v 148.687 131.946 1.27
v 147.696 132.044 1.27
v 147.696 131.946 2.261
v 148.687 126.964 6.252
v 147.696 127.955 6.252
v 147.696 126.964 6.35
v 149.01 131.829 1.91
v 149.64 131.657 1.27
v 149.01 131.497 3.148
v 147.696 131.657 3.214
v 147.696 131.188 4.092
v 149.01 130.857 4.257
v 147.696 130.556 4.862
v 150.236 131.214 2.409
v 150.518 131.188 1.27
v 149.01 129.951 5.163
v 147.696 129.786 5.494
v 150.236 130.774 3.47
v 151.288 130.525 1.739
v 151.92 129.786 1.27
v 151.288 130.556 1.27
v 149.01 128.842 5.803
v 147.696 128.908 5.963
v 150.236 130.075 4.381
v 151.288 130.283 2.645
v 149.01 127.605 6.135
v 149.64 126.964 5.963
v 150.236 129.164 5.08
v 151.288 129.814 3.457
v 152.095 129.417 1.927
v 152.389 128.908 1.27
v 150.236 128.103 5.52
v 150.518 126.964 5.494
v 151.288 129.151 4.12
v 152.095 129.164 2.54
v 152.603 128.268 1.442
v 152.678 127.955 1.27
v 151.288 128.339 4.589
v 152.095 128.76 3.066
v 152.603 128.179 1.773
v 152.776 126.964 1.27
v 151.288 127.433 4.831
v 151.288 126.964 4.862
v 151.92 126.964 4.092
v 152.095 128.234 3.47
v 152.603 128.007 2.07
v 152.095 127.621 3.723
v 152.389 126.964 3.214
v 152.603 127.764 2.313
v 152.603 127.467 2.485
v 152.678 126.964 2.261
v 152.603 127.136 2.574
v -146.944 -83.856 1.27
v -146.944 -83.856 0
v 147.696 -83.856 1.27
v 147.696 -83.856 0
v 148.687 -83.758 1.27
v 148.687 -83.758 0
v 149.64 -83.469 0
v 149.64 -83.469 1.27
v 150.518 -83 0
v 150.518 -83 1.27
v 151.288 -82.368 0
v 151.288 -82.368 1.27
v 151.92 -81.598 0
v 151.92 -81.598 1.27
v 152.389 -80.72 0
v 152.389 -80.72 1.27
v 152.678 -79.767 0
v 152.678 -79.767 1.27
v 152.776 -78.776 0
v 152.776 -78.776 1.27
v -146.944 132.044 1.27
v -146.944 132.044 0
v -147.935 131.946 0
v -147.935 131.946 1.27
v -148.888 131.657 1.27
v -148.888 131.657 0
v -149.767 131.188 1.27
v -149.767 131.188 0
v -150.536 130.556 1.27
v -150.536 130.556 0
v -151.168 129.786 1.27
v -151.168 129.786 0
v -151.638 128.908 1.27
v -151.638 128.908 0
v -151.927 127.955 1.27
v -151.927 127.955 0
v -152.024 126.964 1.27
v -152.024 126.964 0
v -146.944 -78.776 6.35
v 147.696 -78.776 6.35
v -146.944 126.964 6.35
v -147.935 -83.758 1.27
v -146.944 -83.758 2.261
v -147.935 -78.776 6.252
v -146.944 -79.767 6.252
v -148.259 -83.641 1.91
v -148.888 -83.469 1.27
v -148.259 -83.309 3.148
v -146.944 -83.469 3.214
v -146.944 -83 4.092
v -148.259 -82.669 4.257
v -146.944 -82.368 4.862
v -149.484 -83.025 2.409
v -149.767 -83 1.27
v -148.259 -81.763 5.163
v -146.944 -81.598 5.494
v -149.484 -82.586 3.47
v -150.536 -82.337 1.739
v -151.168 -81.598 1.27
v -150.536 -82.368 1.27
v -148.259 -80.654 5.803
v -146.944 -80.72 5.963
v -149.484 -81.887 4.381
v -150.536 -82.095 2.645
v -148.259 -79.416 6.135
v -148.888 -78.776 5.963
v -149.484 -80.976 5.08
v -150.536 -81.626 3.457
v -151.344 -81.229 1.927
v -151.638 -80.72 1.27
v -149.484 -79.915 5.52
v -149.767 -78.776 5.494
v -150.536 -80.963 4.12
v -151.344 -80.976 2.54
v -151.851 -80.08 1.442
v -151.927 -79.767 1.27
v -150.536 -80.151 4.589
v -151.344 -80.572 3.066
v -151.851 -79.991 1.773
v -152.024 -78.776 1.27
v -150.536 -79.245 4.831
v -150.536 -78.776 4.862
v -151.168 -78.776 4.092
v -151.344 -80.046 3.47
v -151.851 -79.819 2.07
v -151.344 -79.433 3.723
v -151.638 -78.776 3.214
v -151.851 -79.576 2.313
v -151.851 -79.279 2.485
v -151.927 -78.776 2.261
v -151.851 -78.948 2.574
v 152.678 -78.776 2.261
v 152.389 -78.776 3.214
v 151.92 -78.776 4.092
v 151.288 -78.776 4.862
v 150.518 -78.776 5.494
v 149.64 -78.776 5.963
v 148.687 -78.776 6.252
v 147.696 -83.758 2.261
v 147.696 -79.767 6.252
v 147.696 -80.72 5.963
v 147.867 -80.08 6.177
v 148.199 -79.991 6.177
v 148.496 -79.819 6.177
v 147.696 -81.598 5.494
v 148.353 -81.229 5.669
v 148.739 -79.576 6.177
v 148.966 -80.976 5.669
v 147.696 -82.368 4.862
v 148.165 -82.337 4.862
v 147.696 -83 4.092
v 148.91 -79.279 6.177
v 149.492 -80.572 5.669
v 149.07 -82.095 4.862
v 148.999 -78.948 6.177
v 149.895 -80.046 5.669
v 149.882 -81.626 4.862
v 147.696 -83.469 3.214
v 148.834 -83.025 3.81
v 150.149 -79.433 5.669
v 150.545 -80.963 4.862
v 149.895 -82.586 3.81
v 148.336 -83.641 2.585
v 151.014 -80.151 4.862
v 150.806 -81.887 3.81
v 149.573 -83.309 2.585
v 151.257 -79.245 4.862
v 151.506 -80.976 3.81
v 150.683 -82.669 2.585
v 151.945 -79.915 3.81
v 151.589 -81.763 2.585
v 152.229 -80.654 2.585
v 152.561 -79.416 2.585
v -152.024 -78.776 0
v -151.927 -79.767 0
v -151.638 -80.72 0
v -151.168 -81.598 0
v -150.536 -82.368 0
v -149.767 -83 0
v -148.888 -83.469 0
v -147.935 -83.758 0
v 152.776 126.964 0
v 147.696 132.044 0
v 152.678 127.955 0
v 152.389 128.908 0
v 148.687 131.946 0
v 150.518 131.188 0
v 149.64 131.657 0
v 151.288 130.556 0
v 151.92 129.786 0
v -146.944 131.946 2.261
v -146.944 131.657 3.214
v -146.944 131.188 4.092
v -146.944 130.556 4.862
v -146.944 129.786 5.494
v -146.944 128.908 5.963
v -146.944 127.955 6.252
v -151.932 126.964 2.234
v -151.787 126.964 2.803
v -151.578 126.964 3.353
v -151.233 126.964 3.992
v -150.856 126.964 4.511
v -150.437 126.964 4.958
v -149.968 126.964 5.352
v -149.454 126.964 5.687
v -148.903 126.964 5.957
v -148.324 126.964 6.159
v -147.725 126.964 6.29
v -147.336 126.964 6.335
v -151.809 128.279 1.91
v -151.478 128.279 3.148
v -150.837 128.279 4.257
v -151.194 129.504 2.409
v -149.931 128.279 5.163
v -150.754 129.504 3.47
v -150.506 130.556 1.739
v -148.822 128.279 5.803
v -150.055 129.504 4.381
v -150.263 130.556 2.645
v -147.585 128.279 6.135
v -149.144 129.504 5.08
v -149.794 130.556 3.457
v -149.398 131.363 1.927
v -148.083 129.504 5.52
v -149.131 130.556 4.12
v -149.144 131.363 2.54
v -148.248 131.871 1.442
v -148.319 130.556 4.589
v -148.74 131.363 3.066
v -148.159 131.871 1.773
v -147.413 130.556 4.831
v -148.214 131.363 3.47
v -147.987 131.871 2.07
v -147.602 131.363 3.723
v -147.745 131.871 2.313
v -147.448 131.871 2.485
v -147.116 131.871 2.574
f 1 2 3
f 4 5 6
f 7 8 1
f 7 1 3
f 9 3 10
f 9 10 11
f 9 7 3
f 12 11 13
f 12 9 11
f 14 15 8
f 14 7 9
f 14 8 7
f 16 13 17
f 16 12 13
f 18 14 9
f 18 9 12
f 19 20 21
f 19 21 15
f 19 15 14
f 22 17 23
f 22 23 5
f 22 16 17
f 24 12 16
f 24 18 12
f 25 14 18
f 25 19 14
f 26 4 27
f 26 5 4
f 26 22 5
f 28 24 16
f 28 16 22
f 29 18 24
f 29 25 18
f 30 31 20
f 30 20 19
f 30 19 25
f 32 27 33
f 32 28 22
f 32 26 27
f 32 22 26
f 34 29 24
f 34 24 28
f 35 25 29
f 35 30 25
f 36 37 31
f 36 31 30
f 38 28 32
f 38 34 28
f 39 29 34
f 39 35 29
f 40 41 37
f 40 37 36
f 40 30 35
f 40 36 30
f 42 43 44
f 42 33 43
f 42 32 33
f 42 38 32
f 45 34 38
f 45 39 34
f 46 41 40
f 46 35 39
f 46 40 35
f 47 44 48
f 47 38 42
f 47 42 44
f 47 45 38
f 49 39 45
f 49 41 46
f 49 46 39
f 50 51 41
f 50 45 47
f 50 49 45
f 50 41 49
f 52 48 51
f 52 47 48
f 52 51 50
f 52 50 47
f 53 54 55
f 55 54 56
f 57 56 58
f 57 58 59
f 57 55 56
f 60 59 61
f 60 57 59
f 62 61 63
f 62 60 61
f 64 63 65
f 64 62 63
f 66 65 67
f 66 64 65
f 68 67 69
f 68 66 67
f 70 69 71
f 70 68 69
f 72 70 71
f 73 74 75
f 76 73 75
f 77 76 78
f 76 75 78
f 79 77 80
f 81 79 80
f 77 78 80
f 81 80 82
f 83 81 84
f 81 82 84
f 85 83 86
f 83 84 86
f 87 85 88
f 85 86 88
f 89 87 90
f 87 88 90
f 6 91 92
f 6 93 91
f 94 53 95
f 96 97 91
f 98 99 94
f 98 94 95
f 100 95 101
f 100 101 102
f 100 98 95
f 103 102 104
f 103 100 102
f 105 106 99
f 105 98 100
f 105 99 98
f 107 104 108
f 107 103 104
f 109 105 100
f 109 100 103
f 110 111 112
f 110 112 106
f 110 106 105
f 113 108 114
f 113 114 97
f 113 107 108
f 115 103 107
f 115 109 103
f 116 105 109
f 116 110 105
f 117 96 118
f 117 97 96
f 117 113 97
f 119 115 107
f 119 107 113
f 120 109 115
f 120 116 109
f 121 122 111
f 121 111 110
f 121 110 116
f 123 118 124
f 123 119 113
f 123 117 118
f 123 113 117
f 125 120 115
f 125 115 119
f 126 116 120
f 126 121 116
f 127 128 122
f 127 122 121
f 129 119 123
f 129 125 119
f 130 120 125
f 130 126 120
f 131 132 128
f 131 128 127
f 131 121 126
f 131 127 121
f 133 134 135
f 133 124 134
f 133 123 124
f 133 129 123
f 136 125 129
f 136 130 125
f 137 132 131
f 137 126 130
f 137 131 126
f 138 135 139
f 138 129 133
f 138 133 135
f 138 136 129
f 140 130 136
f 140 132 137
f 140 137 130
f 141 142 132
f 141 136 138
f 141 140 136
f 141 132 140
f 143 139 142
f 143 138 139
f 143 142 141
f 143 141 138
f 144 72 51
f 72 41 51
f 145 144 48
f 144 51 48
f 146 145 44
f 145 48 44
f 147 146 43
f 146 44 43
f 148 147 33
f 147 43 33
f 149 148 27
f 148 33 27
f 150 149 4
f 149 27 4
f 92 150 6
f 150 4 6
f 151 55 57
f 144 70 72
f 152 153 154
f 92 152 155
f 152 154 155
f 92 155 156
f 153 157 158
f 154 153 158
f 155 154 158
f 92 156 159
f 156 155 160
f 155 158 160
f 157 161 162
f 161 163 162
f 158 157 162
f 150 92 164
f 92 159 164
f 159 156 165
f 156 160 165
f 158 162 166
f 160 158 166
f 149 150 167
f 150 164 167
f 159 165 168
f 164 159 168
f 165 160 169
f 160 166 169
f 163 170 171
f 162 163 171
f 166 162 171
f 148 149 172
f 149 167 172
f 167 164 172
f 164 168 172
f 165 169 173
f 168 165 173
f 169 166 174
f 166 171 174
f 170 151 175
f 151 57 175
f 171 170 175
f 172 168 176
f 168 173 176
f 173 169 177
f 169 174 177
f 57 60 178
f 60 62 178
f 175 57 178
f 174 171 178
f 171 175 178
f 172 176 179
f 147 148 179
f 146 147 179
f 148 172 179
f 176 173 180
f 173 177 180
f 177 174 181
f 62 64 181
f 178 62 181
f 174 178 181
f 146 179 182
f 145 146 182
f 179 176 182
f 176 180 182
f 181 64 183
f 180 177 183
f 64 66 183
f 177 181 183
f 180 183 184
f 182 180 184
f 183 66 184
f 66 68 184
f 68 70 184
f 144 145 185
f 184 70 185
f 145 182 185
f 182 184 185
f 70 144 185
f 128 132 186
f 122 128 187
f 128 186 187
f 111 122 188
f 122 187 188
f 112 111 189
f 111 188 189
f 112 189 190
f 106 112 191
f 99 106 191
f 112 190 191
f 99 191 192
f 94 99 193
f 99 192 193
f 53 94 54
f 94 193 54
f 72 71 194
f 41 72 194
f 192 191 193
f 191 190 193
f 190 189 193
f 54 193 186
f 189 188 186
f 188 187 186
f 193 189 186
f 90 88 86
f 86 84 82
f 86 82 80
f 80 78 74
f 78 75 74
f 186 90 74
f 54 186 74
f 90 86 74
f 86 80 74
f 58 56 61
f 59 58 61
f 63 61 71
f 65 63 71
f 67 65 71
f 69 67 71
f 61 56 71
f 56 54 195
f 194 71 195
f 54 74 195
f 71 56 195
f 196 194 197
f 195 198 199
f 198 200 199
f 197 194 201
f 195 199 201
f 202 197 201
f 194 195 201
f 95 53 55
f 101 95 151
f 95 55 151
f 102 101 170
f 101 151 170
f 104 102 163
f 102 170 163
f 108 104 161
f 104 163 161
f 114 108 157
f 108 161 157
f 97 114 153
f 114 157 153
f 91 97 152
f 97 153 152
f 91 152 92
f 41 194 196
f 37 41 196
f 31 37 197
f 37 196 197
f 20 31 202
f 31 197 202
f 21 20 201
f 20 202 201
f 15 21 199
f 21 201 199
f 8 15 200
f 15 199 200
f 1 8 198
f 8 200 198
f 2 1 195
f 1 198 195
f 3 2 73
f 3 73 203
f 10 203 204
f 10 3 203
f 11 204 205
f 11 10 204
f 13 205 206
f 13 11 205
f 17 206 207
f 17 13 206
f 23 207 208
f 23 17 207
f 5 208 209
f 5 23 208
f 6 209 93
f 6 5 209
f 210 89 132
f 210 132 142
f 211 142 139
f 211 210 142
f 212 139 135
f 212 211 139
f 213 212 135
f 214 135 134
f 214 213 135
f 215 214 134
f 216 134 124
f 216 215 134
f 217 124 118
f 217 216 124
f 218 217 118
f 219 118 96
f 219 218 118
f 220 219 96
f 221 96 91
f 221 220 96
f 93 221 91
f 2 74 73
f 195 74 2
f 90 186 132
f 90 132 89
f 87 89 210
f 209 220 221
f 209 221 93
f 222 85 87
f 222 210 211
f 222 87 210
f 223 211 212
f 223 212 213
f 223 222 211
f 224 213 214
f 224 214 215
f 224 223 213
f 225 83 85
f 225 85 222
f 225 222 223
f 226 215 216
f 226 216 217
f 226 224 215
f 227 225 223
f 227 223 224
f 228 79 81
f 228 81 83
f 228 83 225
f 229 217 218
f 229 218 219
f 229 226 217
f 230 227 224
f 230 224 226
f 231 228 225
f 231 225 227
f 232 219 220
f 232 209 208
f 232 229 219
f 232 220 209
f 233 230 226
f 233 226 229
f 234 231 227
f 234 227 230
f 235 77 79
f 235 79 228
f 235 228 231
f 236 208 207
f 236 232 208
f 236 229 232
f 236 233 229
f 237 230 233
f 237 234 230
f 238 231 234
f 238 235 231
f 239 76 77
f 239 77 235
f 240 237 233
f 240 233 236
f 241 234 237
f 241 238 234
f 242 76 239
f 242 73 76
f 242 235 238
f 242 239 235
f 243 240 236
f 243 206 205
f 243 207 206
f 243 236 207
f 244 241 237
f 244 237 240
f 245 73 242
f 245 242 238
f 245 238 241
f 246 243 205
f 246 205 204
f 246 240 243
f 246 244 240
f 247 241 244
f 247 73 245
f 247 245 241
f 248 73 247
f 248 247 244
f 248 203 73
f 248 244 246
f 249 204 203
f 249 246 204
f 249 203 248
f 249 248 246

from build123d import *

# Parameters (mm, degrees)
F0_W         = 304.8
F0_H         = 215.9
F1_DEPTH     = 6.35
F2_R         = 5.08
F3_T1_DEPTH  = 13.97
F3_S5_W      = 5.08
F3_S5_H      = 5.08
F3_T6_DEPTH  = 5.08
F3_S11_W     = 5.08
F3_S11_H     = 5.08
F3_T12_DEPTH = 5.08
F3_S17_W     = 5.08
F3_S17_H     = 5.08
F3_T18_DEPTH = 5.08


# Not quite as in the source:
# - a fillet or chamfer that OpenCascade refuses, or shapes differently, is made with other operations: its cross-section is extruded or revolved along the edge and cut away or added


with BuildPart() as f1:
    # F0 (on Top) → F1 (new body)
    with BuildSketch(Plane.XY):
        with Locations((0.3756433725, 24.0940256725)):
            Rectangle(F0_W, F0_H)
    extrude(amount=F1_DEPTH)

    # F2
    f2_edges = [f1.edges().sort_by_distance(p)[0] for p in [
        (152.775643, -83.855974, 3.175),
        (0.375643, -83.855974, 6.35),
        (-152.024357, 24.094026, 6.35),
        (0.375643, 132.044026, 6.35),
        (152.775643, 24.094026, 6.35),
    ]]
    fillet(f2_edges, radius=F2_R)

    # F3: fillet of radius 5.08 on 3 edges, made by hand

    # F3_s2 → F3_t1 (cut)
    with BuildSketch(Plane.XY.offset(-12.7)):
        with BuildLine():
            ThreePointArc((-152.0243566275, -78.7759743275), (-150.5364590759, -82.3680767759), (-146.9443566275, -83.8559743275))
            Line((-146.9443566275, -83.8559743275), (-152.0243566275, -83.8559743275))
            Line((-152.0243566275, -83.8559743275), (-152.0243566275, -78.7759743275))
        make_face()
        with BuildLine():
            ThreePointArc((-146.9443566275, 132.0440256725), (-150.5364590759, 130.556128121), (-152.0243566275, 126.9640256725))
            Line((-152.0243566275, 126.9640256725), (-152.0243566275, 132.0440256725))
            Line((-152.0243566275, 132.0440256725), (-146.9443566275, 132.0440256725))
        make_face()
        with BuildLine():
            ThreePointArc((152.7756433725, 126.9640256725), (151.287745821, 130.556128121), (147.6956433725, 132.0440256725))
            Line((147.6956433725, 132.0440256725), (152.7756433725, 132.0440256725))
            Line((152.7756433725, 132.0440256725), (152.7756433725, 126.9640256725))
        make_face()
    extrude(amount=F3_T1_DEPTH, mode=Mode.SUBTRACT)


with BuildPart() as f3_tool4:
    # F3_s5 → F3_t6 (new body)
    with BuildSketch(Plane.YZ.offset(147.6956433725)):
        with Locations((129.5040256725, 3.81)):
            Rectangle(F3_S5_W, F3_S5_H)
    extrude(amount=F3_T6_DEPTH)

    # F3_s7 → F3_t8 (revolve, cut)
    with BuildSketch(Plane(origin=(147.6956433725, 126.9640256725, 1.27), x_dir=(0, -0.7071067812, -0.7071067812), z_dir=(0, -0.7071067812, 0.7071067812))):
        with BuildLine():
            ThreePointArc((0, -5.08), (5.08, 0), (0, 5.08))
            Line((0, 5.08), (0, -5.08))
        make_face()
    revolve(axis=Axis((147.6956433725, 126.9640256725, 1.27), (1, 0, 0)), mode=Mode.SUBTRACT)


with BuildPart() as f1_1:
    add(f1.part)

    # F3_t3: cut F3_tool4
    add(f3_tool4.part, mode=Mode.SUBTRACT)


with BuildPart() as f3_tool10:
    # F3_s11 → F3_t12 (new body)
    with BuildSketch(Plane.XZ.offset(-126.9640256725)):
        with Locations((-149.4843566275, 3.81)):
            Rectangle(F3_S11_W, F3_S11_H)
    extrude(amount=-F3_T12_DEPTH)

    # F3_s13 → F3_t14 (revolve, cut)
    with BuildSketch(Plane(origin=(-146.9443566275, 126.9640256725, 1.27), x_dir=(0.7071067812, 0, -0.7071067812), z_dir=(0.7071067812, 0, 0.7071067812))):
        with BuildLine():
            ThreePointArc((0, -5.08), (5.08, 0), (0, 5.08))
            Line((0, 5.08), (0, -5.08))
        make_face()
    revolve(axis=Axis((-146.9443566275, 126.9640256725, 1.27), (0, 1, 0)), mode=Mode.SUBTRACT)


with BuildPart() as f1_2:
    add(f1_1.part)

    # F3_t9: cut F3_tool10
    add(f3_tool10.part, mode=Mode.SUBTRACT)


with BuildPart() as f3_tool16:
    # F3_s17 → F3_t18 (new body)
    with BuildSketch(Plane.YZ.offset(-146.9443566275)):
        with Locations((-81.3159743275, 3.81)):
            Rectangle(F3_S17_W, F3_S17_H)
    extrude(amount=-F3_T18_DEPTH)

    # F3_s19 → F3_t20 (revolve, cut)
    with BuildSketch(Plane(origin=(-146.9443566275, -78.7759743275, 1.27), x_dir=(0, 0.7071067812, -0.7071067812), z_dir=(0, 0.7071067812, 0.7071067812))):
        with BuildLine():
            ThreePointArc((0, -5.08), (5.08, 0), (0, 5.08))
            Line((0, 5.08), (0, -5.08))
        make_face()
    revolve(axis=Axis((-146.9443566275, -78.7759743275, 1.27), (-1, 0, 0)), mode=Mode.SUBTRACT)


with BuildPart() as f1_3:
    add(f1_2.part)

    # F3_t15: cut F3_tool16
    add(f3_tool16.part, mode=Mode.SUBTRACT)


solid = f1_3.part
